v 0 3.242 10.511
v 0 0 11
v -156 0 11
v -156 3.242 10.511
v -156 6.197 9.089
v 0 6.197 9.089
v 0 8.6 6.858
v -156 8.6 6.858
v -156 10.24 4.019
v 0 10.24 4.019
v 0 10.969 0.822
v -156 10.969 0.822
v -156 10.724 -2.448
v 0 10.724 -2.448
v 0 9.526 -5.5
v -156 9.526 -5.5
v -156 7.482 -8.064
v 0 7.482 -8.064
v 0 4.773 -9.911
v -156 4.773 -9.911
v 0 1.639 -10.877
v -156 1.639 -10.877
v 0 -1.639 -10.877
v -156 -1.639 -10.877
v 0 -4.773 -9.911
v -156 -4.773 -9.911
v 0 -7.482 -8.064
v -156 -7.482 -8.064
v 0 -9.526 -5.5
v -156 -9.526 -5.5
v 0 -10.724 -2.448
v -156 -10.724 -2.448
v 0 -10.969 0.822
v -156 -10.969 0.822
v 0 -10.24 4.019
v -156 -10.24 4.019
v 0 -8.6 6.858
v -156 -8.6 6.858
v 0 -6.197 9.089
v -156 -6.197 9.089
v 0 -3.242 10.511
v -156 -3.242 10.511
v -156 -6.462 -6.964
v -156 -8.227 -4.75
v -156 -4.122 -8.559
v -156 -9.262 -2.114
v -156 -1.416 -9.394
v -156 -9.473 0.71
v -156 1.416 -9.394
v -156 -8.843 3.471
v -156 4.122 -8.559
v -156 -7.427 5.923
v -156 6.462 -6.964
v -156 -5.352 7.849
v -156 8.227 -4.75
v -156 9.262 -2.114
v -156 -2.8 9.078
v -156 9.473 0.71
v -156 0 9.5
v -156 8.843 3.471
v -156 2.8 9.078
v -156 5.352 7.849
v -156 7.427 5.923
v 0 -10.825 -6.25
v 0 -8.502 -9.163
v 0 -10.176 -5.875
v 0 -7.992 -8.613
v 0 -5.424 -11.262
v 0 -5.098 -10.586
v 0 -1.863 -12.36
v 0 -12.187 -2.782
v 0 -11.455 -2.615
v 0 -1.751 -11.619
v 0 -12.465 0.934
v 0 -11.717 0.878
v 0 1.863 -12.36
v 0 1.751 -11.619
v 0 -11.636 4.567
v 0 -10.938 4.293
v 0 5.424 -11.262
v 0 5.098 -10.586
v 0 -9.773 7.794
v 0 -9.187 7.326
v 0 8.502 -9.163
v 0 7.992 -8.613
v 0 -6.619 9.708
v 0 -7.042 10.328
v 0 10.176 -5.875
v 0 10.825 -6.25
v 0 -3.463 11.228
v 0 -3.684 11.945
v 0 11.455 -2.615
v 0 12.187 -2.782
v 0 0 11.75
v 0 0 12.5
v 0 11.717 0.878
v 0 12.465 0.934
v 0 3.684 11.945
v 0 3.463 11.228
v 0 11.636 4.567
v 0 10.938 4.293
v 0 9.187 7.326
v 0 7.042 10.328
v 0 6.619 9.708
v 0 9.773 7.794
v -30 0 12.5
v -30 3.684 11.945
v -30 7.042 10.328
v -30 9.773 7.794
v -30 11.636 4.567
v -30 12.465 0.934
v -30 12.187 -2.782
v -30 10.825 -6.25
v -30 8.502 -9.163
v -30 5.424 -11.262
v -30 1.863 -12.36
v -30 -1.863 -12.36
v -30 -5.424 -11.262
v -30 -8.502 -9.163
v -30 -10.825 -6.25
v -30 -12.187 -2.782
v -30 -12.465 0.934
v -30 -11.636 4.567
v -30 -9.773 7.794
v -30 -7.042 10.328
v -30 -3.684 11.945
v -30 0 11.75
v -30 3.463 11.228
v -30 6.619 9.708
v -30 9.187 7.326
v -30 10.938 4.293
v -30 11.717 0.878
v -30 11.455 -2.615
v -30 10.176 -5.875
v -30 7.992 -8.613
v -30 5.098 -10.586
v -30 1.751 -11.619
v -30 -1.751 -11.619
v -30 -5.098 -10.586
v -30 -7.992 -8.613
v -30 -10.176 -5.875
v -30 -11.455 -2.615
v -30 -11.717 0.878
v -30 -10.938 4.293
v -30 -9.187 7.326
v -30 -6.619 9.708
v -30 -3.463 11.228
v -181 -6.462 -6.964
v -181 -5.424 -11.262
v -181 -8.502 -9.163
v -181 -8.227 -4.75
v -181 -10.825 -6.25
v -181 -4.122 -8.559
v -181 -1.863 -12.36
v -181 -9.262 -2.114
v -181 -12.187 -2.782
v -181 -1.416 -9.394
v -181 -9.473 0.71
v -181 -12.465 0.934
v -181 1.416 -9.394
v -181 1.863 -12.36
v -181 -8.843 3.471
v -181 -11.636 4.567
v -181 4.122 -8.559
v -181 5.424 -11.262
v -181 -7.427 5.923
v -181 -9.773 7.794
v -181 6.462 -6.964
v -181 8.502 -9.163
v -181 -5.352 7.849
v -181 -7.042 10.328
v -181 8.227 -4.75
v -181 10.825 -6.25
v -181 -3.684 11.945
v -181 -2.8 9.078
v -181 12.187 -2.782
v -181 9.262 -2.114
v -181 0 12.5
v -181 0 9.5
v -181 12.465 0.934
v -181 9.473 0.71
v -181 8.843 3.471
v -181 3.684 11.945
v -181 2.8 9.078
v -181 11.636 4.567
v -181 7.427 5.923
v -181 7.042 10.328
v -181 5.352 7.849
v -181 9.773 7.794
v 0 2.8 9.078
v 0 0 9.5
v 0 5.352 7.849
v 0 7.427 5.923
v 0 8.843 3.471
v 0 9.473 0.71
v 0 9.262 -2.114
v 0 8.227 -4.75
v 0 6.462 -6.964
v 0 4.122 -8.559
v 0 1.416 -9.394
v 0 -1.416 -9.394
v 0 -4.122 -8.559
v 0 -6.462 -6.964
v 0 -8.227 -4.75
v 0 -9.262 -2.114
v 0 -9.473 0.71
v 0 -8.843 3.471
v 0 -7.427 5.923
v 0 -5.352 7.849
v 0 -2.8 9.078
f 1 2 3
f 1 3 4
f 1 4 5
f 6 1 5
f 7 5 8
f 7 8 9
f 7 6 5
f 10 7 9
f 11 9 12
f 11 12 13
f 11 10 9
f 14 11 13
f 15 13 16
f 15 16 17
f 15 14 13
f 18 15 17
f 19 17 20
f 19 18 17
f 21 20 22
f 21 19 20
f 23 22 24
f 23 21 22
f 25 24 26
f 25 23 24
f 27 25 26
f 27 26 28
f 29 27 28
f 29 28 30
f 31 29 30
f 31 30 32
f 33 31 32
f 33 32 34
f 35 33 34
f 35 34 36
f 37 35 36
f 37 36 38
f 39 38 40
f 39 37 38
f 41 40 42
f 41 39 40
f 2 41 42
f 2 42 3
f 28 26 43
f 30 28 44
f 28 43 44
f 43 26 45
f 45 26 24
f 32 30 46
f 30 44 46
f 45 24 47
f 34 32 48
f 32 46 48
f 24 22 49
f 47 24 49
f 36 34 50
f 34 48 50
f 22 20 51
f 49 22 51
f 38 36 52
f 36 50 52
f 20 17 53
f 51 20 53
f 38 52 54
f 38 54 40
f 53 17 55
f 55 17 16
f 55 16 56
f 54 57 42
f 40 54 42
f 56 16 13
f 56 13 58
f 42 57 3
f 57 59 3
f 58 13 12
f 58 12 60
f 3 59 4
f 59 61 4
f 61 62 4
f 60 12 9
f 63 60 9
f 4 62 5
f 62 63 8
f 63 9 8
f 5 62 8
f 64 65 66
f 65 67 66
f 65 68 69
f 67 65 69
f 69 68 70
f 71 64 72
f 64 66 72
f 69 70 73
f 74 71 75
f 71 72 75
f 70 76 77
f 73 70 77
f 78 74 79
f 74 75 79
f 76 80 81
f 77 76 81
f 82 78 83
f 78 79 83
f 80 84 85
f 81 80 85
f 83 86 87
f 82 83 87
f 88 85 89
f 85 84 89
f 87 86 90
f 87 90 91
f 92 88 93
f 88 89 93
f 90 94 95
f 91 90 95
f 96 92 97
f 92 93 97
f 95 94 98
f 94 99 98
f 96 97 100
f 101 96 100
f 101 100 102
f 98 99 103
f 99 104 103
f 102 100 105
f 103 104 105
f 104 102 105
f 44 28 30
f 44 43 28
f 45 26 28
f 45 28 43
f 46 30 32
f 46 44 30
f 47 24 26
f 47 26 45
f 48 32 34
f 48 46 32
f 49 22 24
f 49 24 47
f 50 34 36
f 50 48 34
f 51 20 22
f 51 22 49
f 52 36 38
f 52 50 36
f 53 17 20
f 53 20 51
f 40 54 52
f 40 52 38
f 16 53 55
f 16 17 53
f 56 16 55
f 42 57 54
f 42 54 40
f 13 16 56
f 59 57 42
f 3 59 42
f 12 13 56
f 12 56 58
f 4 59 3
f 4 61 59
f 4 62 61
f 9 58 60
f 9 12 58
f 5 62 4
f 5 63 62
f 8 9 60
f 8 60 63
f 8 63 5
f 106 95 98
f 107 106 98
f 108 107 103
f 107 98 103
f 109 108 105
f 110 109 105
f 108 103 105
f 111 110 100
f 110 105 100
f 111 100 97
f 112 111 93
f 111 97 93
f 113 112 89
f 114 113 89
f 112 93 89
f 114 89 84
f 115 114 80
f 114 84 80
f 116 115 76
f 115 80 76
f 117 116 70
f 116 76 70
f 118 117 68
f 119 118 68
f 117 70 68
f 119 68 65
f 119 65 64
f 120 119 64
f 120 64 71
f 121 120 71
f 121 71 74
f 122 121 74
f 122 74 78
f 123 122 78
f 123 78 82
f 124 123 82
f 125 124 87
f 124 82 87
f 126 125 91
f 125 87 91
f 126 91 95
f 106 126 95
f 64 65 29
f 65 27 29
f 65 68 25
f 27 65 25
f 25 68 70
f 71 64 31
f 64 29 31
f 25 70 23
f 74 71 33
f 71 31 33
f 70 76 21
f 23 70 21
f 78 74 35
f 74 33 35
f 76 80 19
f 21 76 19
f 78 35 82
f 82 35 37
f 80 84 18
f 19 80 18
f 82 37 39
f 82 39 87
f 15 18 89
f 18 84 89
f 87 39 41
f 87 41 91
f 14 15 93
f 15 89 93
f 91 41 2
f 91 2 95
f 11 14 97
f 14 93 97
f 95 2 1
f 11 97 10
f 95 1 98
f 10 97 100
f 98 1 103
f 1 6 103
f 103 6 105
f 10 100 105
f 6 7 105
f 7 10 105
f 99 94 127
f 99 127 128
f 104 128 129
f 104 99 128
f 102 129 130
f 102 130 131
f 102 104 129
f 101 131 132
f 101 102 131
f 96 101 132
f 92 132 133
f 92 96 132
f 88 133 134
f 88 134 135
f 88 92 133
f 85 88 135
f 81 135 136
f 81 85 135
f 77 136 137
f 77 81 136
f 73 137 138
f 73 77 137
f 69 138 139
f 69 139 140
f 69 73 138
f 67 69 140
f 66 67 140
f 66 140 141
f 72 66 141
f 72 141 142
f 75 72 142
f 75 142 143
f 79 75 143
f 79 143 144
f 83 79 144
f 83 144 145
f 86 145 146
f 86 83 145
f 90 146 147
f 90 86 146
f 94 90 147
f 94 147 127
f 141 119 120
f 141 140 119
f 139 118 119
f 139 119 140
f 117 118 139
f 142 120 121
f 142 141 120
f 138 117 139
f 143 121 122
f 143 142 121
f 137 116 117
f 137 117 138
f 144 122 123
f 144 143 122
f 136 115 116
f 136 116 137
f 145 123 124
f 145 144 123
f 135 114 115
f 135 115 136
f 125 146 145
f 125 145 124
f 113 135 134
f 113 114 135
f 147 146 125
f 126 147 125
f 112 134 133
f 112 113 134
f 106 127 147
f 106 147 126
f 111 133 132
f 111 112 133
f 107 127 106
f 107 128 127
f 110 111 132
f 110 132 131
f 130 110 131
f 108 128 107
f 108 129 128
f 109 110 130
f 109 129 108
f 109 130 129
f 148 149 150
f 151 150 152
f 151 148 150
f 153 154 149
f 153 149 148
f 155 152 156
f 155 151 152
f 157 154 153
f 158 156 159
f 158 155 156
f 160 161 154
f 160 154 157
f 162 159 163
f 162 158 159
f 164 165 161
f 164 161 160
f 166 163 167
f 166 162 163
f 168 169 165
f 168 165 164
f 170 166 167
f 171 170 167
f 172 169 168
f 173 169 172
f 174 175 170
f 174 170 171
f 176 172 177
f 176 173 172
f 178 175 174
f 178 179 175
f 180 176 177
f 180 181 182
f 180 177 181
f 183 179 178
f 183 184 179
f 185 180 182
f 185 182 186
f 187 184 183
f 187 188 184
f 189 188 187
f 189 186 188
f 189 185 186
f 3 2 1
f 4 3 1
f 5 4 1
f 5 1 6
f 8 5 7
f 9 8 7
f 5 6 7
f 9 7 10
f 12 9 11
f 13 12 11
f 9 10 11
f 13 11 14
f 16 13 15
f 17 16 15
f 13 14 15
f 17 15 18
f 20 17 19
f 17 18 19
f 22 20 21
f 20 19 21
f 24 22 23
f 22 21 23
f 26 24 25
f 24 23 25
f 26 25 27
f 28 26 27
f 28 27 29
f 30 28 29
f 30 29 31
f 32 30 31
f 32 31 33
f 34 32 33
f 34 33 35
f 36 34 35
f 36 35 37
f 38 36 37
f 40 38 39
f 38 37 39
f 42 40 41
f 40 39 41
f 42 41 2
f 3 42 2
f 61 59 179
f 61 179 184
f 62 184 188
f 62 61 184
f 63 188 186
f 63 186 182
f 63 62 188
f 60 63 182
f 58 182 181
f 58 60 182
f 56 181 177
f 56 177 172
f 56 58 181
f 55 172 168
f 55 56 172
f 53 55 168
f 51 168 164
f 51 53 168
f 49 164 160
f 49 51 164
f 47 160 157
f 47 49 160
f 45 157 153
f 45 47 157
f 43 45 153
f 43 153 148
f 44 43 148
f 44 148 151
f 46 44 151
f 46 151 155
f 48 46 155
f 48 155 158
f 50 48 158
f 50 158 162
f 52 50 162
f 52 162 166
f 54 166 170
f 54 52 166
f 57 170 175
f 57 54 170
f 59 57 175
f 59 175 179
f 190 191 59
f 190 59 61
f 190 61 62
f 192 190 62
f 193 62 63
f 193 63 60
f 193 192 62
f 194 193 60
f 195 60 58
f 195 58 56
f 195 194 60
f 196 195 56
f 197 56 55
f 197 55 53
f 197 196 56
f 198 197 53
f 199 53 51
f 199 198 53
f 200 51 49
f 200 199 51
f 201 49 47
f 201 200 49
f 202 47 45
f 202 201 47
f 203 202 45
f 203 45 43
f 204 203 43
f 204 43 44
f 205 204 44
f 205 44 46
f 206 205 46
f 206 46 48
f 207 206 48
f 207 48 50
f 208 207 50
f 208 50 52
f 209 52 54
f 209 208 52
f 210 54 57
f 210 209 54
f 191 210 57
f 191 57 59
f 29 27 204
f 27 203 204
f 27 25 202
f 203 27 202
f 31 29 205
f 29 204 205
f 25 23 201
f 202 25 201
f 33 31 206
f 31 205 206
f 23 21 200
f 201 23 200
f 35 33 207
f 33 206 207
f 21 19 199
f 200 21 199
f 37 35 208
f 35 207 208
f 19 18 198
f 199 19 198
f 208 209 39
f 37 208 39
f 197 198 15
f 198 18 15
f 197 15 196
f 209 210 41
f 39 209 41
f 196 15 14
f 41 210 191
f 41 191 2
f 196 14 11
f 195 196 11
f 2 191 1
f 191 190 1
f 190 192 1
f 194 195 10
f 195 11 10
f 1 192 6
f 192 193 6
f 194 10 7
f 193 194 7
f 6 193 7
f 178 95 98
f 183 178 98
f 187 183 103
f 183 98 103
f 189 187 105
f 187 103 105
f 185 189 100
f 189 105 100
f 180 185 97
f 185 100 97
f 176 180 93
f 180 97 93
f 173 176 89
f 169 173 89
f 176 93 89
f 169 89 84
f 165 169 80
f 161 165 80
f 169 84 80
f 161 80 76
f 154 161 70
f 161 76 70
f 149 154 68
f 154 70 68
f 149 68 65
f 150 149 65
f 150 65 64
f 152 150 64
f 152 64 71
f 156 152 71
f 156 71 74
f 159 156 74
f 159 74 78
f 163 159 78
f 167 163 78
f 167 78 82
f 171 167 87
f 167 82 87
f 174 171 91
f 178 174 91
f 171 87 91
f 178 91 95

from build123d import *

# Parameters (mm, degrees)
CYLINDER001_R           = 9.5
CYLINDER001_DEPTH       = 156
CYLINDER001_PITCH_ANGLE = -90
CYLINDER_R              = 11
CYLINDER_DEPTH          = 156
CYLINDER_PITCH_ANGLE    = -90
CYLINDER004_R           = 9.5
CYLINDER004_DEPTH       = 25
CYLINDER004_PITCH_ANGLE = -90
CYLINDER003_R           = 11
CYLINDER003_DEPTH       = 156
CYLINDER003_PITCH_ANGLE = -90
CYLINDER002_R           = 12.5
CYLINDER002_DEPTH       = 181
CYLINDER002_PITCH_ANGLE = -90
CYLINDER006_R           = 11.75
CYLINDER006_DEPTH       = 30
CYLINDER006_PITCH_ANGLE = -90
CYLINDER005_R           = 12.5
CYLINDER005_DEPTH       = 30
CYLINDER005_PITCH_ANGLE = -90


with BuildPart() as innerc:
    # Cylinder001 → Cylinder001 (new body)
    with BuildSketch(Plane.XY):
        Circle(CYLINDER001_R)
    extrude(amount=CYLINDER001_DEPTH)


with BuildPart() as innerc_1:
    # Cylinder001 pitch: moved
    add(innerc.part.rotate(Axis((0, 0, 0), (0, 1, 0)), CYLINDER001_PITCH_ANGLE))


with BuildPart() as innerc_2:
    # Cylinder001 placement: moved
    add(innerc_1.part)


with BuildPart() as steeltube:
    # Cylinder → Cylinder (new body)
    with BuildSketch(Plane.XY):
        Circle(CYLINDER_R)
    extrude(amount=CYLINDER_DEPTH)


with BuildPart() as steeltube_1:
    # Cylinder pitch: moved
    add(steeltube.part.rotate(Axis((0, 0, 0), (0, 1, 0)), CYLINDER_PITCH_ANGLE))


with BuildPart() as steeltube_2:
    # Cylinder placement: moved
    add(steeltube_1.part)

    # Cut: cut InnerC
    add(innerc_2.part, mode=Mode.SUBTRACT)


with BuildPart() as cylinder004:
    # Cylinder004 → Cylinder004 (new body)
    with BuildSketch(Plane.XY):
        Circle(CYLINDER004_R)
    extrude(amount=CYLINDER004_DEPTH)


with BuildPart() as cylinder004_1:
    # Cylinder004 pitch: moved
    add(cylinder004.part.rotate(Axis((0, 0, 0), (0, 1, 0)), CYLINDER004_PITCH_ANGLE))


with BuildPart() as cylinder004_2:
    # Cylinder004 placement: moved
    add(cylinder004_1.part.moved(Location((-156, 0, 0))))


with BuildPart() as cylinder003:
    # Cylinder003 → Cylinder003 (new body)
    with BuildSketch(Plane.XY):
        Circle(CYLINDER003_R)
    extrude(amount=CYLINDER003_DEPTH)


with BuildPart() as cylinder003_1:
    # Cylinder003 pitch: moved
    add(cylinder003.part.rotate(Axis((0, 0, 0), (0, 1, 0)), CYLINDER003_PITCH_ANGLE))


with BuildPart() as cylinder003_2:
    # Cylinder003 placement: moved
    add(cylinder003_1.part)


with BuildPart() as batterypart:
    # Cylinder002 → Cylinder002 (new body)
    with BuildSketch(Plane.XY):
        Circle(CYLINDER002_R)
    extrude(amount=CYLINDER002_DEPTH)


with BuildPart() as batterypart_1:
    # Cylinder002 pitch: moved
    add(batterypart.part.rotate(Axis((0, 0, 0), (0, 1, 0)), CYLINDER002_PITCH_ANGLE))


with BuildPart() as batterypart_2:
    # Cylinder002 placement: moved
    add(batterypart_1.part)

    # Cut001: cut Cylinder003
    add(cylinder003_2.part, mode=Mode.SUBTRACT)

    # Cut002: cut Cylinder004
    add(cylinder004_2.part, mode=Mode.SUBTRACT)


with BuildPart() as cylinder006:
    # Cylinder006 → Cylinder006 (new body)
    with BuildSketch(Plane.XY):
        Circle(CYLINDER006_R)
    extrude(amount=CYLINDER006_DEPTH)


with BuildPart() as cylinder006_1:
    # Cylinder006 pitch: moved
    add(cylinder006.part.rotate(Axis((0, 0, 0), (0, 1, 0)), CYLINDER006_PITCH_ANGLE))


with BuildPart() as cylinder006_2:
    # Cylinder006 placement: moved
    add(cylinder006_1.part)


with BuildPart() as cut003:
    # Cylinder005 → Cylinder005 (new body)
    with BuildSketch(Plane.XY):
        Circle(CYLINDER005_R)
    extrude(amount=CYLINDER005_DEPTH)


with BuildPart() as cut003_1:
    # Cylinder005 pitch: moved
    add(cut003.part.rotate(Axis((0, 0, 0), (0, 1, 0)), CYLINDER005_PITCH_ANGLE))


with BuildPart() as cut003_2:
    # Cylinder005 placement: moved
    add(cut003_1.part)

    # Cut003: cut Cylinder006
    add(cylinder006_2.part, mode=Mode.SUBTRACT)


solid = Compound([steeltube_2.part, batterypart_2.part, cut003_2.part])
